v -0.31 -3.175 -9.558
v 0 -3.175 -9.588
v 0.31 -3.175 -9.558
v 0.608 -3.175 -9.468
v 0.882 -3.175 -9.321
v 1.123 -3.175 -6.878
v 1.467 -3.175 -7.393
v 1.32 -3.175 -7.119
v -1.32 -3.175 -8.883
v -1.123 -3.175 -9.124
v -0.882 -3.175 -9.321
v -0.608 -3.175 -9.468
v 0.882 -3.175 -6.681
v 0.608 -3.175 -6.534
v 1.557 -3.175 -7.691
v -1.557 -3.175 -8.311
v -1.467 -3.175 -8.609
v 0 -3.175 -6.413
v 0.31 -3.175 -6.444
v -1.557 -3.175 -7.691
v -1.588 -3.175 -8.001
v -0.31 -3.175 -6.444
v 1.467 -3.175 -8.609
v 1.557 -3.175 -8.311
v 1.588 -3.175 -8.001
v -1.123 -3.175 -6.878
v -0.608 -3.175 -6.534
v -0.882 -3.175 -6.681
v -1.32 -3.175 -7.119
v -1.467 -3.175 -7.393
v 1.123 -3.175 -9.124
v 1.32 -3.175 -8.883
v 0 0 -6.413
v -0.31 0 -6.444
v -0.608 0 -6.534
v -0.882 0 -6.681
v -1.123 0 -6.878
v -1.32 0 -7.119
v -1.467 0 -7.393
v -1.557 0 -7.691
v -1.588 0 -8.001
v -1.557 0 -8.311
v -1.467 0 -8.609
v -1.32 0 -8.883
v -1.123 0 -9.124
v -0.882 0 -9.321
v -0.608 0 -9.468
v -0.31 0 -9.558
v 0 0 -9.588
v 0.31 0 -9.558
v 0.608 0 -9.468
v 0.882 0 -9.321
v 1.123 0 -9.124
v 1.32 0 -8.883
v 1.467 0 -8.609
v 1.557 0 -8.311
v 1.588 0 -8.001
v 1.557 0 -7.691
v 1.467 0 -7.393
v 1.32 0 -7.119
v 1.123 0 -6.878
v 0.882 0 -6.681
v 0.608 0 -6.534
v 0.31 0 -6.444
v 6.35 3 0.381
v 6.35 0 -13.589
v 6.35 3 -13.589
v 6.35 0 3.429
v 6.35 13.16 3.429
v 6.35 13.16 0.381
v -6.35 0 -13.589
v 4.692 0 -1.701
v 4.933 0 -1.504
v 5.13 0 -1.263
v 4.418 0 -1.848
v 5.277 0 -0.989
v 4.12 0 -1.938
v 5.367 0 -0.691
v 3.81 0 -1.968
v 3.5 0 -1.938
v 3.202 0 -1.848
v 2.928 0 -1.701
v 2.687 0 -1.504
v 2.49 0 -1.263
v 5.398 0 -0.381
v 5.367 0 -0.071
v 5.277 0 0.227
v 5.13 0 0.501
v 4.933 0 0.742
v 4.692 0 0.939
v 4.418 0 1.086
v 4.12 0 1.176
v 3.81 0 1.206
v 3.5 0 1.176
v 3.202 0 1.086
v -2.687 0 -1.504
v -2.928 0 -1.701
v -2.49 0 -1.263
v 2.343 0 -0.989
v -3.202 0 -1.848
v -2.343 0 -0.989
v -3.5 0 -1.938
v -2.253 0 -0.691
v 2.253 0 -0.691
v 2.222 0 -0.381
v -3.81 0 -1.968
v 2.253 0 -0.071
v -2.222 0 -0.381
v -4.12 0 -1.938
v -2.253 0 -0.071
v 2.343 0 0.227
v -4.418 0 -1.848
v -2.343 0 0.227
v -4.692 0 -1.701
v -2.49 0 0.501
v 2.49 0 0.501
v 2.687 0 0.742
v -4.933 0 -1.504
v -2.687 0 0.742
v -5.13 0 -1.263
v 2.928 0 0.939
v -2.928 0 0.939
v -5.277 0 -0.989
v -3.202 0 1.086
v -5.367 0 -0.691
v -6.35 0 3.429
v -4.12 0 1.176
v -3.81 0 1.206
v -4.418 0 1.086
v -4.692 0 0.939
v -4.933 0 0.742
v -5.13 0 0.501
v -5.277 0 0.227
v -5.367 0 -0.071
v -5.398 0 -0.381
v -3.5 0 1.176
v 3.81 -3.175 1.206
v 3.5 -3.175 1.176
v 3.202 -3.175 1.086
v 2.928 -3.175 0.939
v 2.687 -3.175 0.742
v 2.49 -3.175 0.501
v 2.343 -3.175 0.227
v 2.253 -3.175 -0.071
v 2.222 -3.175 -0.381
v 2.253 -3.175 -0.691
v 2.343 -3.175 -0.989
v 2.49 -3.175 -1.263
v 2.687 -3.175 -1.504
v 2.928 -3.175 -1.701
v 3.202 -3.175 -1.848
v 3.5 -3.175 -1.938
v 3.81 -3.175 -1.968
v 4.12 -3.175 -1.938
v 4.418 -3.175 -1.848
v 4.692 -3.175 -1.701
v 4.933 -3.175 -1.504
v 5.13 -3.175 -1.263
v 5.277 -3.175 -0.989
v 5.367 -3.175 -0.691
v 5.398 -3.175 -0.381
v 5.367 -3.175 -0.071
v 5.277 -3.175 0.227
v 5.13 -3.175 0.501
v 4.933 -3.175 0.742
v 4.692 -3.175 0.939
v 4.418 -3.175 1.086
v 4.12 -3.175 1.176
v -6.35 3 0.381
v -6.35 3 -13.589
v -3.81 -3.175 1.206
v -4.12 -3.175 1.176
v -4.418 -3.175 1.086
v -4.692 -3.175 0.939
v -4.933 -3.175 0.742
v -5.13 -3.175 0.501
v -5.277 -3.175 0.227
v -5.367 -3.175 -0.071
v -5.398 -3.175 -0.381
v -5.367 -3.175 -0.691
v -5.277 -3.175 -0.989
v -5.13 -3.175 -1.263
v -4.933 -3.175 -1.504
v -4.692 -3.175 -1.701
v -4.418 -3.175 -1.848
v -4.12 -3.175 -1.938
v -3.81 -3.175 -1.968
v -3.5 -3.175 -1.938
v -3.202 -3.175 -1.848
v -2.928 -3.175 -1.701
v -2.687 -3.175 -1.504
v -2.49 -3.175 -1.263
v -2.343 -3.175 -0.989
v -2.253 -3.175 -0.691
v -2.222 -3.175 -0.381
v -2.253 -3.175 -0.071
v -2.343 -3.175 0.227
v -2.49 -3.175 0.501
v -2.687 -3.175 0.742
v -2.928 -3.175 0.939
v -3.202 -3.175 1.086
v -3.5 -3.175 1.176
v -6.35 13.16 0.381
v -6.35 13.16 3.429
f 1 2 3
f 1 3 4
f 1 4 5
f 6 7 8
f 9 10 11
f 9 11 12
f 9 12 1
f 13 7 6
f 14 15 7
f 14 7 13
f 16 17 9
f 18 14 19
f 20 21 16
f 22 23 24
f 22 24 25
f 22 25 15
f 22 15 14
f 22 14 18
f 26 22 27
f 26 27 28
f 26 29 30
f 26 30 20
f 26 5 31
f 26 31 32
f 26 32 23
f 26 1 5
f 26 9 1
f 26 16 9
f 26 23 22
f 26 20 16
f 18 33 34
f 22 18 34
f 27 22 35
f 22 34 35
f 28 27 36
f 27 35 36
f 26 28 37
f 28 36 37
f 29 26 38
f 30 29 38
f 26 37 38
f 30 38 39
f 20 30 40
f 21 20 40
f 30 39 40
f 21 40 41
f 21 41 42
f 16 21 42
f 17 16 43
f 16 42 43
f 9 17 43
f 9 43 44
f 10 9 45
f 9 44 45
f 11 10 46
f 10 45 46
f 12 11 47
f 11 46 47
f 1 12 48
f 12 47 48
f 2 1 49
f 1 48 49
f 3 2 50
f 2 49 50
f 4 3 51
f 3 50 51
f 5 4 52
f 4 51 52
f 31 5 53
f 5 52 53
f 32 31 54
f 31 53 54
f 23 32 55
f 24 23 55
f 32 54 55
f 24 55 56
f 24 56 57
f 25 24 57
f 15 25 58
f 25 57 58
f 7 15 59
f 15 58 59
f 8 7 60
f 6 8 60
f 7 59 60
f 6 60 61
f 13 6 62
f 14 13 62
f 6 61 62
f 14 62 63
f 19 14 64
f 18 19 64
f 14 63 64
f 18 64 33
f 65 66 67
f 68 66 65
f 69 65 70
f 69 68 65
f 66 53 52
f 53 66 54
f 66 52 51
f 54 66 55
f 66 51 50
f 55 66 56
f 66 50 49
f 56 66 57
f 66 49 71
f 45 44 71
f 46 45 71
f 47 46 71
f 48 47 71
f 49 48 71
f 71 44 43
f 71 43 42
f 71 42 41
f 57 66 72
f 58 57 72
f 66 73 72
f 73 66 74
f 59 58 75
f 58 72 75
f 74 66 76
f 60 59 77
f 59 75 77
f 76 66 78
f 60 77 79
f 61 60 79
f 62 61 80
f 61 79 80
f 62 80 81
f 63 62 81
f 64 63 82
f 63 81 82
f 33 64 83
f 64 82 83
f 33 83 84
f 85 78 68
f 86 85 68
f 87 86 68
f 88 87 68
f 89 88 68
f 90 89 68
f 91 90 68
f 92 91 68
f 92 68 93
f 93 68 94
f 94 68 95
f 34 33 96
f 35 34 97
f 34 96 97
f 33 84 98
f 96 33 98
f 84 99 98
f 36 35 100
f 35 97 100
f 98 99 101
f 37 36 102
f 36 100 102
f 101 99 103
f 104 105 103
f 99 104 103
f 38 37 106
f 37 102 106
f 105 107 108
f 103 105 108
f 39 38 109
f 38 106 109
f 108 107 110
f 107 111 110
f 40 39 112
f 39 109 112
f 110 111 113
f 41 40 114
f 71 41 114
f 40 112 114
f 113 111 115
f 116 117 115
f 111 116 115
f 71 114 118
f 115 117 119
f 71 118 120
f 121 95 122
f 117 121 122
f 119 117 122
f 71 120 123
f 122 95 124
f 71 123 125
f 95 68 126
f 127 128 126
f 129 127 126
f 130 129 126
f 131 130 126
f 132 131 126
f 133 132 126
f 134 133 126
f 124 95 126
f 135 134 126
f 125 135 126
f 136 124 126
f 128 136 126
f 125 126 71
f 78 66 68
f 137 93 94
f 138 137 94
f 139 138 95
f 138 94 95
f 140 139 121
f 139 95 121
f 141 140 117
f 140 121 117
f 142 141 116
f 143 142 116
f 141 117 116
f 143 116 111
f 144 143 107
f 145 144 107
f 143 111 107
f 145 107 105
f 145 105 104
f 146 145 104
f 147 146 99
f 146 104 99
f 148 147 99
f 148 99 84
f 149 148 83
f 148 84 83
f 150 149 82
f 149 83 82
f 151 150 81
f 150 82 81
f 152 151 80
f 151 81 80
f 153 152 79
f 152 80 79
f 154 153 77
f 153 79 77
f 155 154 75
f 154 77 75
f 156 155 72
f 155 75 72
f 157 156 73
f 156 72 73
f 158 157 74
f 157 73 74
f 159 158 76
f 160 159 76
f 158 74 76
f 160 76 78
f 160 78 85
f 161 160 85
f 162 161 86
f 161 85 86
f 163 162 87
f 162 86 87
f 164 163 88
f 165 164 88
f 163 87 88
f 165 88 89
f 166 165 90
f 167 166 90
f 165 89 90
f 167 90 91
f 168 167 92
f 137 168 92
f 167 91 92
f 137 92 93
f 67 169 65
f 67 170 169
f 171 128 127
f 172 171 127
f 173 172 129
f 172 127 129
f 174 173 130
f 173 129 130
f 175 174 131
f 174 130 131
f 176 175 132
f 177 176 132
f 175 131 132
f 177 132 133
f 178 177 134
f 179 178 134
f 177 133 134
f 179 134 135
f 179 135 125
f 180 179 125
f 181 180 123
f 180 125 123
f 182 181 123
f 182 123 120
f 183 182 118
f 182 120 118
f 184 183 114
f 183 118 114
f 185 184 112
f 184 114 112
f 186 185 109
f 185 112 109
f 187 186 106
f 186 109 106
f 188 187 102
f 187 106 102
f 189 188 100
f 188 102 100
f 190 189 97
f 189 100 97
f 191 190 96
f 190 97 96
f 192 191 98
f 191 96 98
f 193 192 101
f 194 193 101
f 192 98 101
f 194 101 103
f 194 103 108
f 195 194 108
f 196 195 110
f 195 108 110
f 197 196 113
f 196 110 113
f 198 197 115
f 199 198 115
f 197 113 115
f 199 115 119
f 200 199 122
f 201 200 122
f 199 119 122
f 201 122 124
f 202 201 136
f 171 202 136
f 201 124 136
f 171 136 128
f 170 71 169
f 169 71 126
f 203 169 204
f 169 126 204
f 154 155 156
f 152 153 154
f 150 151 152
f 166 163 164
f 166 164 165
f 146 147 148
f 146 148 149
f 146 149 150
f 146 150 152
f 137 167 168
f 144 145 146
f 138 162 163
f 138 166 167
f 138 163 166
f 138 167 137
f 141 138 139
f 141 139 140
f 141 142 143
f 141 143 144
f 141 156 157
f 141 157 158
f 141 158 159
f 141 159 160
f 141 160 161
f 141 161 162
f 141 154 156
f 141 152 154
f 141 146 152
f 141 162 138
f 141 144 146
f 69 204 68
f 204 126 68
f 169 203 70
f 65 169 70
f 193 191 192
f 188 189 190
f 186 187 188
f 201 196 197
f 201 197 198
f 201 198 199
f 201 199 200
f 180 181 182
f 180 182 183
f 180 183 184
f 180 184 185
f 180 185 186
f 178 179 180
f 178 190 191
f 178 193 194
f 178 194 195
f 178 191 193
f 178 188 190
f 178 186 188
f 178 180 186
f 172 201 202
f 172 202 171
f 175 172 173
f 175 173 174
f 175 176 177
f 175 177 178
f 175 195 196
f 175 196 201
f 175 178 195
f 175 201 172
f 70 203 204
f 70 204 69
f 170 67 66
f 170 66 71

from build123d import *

# Parameters (mm, degrees)
SKETCH2_W           = 12.7
SKETCH2_H           = 6.858
BOSS_EXTRUDE1_DEPTH = 3
SKETCH3_R           = 1.5875
BOSS_EXTRUDE2_DEPTH = 3.175
SKETCH4_W           = 12.7
SKETCH4_H           = 3.81
BOSS_EXTRUDE3_DEPTH = 10.16
SKETCH8_W           = 12.7
SKETCH8_H           = 3
BOSS_EXTRUDE6_DEPTH = 10.16
SKETCH11_R          = 1.5875
BOSS_EXTRUDE7_DEPTH = 3.175
SKETCH12_W          = 12.7
SKETCH12_H          = 0.762
CUT_EXTRUDE1_DEPTH  = 10.16


with BuildPart() as part:
    # Sketch2 → Boss-Extrude1 (new body)
    with BuildSketch(Plane(origin=(0, 0, 0), x_dir=(1, 0, 0), z_dir=(0, 1, 0))):
        Rectangle(SKETCH2_W, SKETCH2_H)
    extrude(amount=BOSS_EXTRUDE1_DEPTH)

    # Sketch3 → Boss-Extrude2 (add)
    with BuildSketch(Plane.XZ):
        with Locations(Location((3.81, -0.381, 0), (0, 0, 90))):
            Circle(SKETCH3_R)
        with Locations(Location((-3.81, -0.381, 0), (0, 0, 90))):
            Circle(SKETCH3_R)
    extrude(amount=BOSS_EXTRUDE2_DEPTH)

    # Sketch4 → Boss-Extrude3 (add)
    with BuildSketch(Plane(origin=(0, 3, 0), x_dir=(1, 0, 0), z_dir=(0, 1, 0))):
        with Locations((0, -1.524)):
            Rectangle(SKETCH4_W, SKETCH4_H)
    extrude(amount=BOSS_EXTRUDE3_DEPTH)

    # Sketch8 → Boss-Extrude6 (add)
    with BuildSketch(Plane(origin=(0, 0, -3.429), x_dir=(-1, 0, 0), z_dir=(0, 0, -1))):
        with Locations((0, 1.5)):
            Rectangle(SKETCH8_W, SKETCH8_H)
    extrude(amount=BOSS_EXTRUDE6_DEPTH)

    # Sketch11 → Boss-Extrude7 (add)
    with BuildSketch(Plane.XZ):
        with Locations(Location((0, -8.001, 0), (0, 0, 90))):
            Circle(SKETCH11_R)
    extrude(amount=BOSS_EXTRUDE7_DEPTH)

    # Sketch12 → Cut-Extrude1 (cut)
    with BuildSketch(Plane(origin=(0, 13.16, 0), x_dir=(1, 0, 0), z_dir=(0, 1, 0))):
        Rectangle(SKETCH12_W, SKETCH12_H)
    extrude(amount=-CUT_EXTRUDE1_DEPTH, mode=Mode.SUBTRACT)


solid = part.part
